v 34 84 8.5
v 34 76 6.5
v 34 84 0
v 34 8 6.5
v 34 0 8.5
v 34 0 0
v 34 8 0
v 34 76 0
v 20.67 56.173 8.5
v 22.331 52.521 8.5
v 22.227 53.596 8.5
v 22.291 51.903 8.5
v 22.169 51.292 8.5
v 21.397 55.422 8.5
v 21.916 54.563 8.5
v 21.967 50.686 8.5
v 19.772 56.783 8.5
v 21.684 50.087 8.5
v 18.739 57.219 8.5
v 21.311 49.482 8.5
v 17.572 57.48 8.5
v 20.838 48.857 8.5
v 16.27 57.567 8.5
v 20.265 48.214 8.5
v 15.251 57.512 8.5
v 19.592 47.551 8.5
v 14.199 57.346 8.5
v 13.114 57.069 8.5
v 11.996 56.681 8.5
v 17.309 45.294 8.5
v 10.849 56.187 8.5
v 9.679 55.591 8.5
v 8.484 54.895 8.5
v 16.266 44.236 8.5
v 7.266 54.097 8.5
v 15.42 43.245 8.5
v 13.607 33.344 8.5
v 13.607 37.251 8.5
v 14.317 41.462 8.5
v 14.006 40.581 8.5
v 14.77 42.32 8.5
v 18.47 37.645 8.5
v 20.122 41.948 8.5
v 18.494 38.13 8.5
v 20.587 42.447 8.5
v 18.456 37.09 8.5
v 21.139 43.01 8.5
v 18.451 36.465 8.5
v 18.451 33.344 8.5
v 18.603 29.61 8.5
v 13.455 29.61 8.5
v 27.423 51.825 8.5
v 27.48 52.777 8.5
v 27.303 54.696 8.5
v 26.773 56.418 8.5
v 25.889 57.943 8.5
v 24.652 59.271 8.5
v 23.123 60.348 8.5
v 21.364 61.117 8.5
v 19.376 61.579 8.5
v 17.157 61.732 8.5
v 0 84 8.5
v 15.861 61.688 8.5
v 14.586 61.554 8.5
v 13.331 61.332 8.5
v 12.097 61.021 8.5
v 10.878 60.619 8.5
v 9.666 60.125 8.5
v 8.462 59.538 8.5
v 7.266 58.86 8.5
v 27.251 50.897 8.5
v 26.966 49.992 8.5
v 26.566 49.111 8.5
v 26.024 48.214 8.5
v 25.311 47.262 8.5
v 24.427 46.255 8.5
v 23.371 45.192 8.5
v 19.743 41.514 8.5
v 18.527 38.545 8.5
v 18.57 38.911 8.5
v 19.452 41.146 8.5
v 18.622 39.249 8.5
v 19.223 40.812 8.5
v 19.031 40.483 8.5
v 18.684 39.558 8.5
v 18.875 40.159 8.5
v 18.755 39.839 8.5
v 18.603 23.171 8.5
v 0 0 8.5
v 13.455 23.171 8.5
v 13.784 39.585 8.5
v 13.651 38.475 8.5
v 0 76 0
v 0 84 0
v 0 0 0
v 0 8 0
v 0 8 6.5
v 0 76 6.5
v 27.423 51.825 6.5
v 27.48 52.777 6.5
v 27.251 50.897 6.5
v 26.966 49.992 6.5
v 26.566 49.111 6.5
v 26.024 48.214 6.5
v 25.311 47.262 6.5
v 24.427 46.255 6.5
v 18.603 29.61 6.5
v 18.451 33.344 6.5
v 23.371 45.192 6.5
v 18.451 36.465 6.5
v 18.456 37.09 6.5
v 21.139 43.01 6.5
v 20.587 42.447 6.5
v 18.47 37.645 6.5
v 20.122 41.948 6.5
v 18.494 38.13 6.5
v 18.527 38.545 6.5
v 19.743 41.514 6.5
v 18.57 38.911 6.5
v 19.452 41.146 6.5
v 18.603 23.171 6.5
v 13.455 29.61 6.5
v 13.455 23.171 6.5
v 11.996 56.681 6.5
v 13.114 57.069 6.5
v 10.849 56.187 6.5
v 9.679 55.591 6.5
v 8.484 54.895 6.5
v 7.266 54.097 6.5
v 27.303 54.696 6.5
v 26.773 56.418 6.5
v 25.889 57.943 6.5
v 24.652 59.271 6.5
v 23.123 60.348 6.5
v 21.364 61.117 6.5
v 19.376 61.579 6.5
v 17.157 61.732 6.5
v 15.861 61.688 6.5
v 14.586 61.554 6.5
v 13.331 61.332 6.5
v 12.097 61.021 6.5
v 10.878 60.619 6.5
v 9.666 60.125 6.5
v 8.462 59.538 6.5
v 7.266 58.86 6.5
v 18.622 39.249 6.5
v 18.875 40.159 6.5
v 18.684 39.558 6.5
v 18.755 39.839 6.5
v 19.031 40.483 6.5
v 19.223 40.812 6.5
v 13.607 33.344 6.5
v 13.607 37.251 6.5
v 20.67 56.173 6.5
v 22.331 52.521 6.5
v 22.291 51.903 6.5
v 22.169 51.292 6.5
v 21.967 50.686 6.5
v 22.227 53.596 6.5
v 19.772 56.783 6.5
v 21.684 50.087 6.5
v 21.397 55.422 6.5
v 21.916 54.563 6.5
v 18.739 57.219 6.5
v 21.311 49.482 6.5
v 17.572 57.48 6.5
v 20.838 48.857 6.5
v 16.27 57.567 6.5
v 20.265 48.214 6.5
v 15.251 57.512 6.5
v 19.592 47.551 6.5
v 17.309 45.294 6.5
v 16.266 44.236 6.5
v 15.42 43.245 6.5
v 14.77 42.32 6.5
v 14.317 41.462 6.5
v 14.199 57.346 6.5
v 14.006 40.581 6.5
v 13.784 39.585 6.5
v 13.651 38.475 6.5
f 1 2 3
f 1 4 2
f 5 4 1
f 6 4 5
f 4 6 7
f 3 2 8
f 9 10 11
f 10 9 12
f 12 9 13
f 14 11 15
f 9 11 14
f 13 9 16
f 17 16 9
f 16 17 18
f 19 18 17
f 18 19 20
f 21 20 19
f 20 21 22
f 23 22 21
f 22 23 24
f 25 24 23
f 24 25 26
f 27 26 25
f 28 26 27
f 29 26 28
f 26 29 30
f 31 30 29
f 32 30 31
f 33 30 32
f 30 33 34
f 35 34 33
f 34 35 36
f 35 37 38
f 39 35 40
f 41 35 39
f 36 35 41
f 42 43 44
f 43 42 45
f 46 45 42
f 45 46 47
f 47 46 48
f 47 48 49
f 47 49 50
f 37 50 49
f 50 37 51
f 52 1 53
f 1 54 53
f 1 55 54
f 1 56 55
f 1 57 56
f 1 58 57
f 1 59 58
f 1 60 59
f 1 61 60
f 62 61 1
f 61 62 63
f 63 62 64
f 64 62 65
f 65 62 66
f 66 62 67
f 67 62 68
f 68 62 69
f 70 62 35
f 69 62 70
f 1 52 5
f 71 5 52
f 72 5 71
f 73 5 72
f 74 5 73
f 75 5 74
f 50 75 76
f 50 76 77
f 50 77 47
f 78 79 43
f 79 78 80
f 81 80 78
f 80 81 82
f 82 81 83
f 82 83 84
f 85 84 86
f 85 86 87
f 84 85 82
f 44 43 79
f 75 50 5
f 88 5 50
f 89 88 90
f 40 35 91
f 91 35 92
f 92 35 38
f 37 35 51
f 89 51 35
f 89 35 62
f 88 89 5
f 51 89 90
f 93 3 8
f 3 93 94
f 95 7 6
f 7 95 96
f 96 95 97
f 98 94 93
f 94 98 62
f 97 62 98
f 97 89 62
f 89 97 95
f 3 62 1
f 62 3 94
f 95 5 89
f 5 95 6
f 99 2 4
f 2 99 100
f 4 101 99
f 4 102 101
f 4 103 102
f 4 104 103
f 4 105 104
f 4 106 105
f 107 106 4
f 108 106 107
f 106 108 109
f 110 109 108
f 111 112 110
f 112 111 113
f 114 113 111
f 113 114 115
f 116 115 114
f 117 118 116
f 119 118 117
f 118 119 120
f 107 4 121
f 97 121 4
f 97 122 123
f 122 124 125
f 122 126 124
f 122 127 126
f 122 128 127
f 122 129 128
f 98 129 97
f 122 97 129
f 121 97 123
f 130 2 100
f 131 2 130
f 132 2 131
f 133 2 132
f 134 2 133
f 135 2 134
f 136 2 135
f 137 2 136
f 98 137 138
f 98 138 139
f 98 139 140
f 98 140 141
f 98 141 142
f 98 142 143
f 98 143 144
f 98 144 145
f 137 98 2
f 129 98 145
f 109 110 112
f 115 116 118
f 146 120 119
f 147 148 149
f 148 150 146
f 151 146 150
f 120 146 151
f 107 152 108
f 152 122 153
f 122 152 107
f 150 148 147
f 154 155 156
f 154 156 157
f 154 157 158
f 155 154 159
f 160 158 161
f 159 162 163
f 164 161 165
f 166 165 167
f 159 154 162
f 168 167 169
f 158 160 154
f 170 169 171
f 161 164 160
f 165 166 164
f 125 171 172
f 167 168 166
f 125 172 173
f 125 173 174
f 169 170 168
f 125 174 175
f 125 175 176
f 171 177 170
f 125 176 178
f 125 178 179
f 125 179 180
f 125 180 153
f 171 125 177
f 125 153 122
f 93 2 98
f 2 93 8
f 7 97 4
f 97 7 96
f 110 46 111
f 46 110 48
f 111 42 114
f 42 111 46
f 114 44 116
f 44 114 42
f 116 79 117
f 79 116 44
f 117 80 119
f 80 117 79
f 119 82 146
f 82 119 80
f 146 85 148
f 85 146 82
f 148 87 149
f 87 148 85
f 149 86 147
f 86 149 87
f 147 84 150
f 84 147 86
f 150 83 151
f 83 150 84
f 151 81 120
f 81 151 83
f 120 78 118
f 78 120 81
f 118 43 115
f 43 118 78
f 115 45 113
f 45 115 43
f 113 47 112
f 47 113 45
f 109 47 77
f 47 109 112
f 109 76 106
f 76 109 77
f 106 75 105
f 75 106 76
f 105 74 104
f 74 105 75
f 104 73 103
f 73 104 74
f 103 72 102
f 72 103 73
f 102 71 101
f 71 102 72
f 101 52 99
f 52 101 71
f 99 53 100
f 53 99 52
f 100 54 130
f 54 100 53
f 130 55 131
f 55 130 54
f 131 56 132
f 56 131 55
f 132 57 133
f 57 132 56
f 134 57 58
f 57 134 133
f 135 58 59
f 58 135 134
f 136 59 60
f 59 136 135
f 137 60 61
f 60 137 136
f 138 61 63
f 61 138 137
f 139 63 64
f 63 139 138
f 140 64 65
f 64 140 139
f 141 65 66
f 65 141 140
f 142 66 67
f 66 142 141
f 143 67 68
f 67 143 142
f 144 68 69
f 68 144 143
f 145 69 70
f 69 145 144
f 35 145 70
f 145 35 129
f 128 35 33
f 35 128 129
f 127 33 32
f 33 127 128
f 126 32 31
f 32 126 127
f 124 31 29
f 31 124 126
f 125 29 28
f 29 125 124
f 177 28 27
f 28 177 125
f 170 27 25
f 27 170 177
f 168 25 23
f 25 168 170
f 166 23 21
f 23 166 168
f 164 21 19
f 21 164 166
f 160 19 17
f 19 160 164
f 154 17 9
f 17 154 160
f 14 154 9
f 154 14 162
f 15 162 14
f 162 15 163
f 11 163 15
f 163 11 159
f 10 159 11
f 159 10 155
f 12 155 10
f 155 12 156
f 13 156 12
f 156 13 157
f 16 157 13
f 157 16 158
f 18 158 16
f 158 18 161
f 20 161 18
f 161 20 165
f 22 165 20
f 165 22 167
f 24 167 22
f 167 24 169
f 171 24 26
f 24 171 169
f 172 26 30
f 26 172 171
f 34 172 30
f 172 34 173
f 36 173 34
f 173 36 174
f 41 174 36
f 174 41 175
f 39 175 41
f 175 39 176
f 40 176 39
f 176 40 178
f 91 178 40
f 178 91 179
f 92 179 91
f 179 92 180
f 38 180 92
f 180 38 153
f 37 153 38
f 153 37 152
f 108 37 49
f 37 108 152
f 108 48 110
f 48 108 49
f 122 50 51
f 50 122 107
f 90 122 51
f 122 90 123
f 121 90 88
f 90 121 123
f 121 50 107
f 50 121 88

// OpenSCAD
    
switch_length=68;
switch_width=34;
standoff=6.5;
thickness=2;
foot_length=8;

font="Chalkboard";
font_scale_factor=1.1;

total_depth=standoff+thickness;
total_length=switch_length+(foot_length*2);

module text_cutout () {
  translate([switch_width/2, total_length/2, -total_depth/4]) {
  linear_extrude(height = 2*total_depth) {
    text("?", font=font, size = switch_length/2*font_scale_factor, valign="center", halign="center");
  }
}}

module switch_body() {
      cube(center=false, [switch_width, total_length,total_depth]);
}

module switch_cutout() {
  translate([-0.1, foot_length, -0.1]) {
      cube(center=false, [switch_width+0.2, switch_length,standoff+0.1]);
  }}

difference() {
switch_body();
    switch_cutout();
    text_cutout();
  
}
